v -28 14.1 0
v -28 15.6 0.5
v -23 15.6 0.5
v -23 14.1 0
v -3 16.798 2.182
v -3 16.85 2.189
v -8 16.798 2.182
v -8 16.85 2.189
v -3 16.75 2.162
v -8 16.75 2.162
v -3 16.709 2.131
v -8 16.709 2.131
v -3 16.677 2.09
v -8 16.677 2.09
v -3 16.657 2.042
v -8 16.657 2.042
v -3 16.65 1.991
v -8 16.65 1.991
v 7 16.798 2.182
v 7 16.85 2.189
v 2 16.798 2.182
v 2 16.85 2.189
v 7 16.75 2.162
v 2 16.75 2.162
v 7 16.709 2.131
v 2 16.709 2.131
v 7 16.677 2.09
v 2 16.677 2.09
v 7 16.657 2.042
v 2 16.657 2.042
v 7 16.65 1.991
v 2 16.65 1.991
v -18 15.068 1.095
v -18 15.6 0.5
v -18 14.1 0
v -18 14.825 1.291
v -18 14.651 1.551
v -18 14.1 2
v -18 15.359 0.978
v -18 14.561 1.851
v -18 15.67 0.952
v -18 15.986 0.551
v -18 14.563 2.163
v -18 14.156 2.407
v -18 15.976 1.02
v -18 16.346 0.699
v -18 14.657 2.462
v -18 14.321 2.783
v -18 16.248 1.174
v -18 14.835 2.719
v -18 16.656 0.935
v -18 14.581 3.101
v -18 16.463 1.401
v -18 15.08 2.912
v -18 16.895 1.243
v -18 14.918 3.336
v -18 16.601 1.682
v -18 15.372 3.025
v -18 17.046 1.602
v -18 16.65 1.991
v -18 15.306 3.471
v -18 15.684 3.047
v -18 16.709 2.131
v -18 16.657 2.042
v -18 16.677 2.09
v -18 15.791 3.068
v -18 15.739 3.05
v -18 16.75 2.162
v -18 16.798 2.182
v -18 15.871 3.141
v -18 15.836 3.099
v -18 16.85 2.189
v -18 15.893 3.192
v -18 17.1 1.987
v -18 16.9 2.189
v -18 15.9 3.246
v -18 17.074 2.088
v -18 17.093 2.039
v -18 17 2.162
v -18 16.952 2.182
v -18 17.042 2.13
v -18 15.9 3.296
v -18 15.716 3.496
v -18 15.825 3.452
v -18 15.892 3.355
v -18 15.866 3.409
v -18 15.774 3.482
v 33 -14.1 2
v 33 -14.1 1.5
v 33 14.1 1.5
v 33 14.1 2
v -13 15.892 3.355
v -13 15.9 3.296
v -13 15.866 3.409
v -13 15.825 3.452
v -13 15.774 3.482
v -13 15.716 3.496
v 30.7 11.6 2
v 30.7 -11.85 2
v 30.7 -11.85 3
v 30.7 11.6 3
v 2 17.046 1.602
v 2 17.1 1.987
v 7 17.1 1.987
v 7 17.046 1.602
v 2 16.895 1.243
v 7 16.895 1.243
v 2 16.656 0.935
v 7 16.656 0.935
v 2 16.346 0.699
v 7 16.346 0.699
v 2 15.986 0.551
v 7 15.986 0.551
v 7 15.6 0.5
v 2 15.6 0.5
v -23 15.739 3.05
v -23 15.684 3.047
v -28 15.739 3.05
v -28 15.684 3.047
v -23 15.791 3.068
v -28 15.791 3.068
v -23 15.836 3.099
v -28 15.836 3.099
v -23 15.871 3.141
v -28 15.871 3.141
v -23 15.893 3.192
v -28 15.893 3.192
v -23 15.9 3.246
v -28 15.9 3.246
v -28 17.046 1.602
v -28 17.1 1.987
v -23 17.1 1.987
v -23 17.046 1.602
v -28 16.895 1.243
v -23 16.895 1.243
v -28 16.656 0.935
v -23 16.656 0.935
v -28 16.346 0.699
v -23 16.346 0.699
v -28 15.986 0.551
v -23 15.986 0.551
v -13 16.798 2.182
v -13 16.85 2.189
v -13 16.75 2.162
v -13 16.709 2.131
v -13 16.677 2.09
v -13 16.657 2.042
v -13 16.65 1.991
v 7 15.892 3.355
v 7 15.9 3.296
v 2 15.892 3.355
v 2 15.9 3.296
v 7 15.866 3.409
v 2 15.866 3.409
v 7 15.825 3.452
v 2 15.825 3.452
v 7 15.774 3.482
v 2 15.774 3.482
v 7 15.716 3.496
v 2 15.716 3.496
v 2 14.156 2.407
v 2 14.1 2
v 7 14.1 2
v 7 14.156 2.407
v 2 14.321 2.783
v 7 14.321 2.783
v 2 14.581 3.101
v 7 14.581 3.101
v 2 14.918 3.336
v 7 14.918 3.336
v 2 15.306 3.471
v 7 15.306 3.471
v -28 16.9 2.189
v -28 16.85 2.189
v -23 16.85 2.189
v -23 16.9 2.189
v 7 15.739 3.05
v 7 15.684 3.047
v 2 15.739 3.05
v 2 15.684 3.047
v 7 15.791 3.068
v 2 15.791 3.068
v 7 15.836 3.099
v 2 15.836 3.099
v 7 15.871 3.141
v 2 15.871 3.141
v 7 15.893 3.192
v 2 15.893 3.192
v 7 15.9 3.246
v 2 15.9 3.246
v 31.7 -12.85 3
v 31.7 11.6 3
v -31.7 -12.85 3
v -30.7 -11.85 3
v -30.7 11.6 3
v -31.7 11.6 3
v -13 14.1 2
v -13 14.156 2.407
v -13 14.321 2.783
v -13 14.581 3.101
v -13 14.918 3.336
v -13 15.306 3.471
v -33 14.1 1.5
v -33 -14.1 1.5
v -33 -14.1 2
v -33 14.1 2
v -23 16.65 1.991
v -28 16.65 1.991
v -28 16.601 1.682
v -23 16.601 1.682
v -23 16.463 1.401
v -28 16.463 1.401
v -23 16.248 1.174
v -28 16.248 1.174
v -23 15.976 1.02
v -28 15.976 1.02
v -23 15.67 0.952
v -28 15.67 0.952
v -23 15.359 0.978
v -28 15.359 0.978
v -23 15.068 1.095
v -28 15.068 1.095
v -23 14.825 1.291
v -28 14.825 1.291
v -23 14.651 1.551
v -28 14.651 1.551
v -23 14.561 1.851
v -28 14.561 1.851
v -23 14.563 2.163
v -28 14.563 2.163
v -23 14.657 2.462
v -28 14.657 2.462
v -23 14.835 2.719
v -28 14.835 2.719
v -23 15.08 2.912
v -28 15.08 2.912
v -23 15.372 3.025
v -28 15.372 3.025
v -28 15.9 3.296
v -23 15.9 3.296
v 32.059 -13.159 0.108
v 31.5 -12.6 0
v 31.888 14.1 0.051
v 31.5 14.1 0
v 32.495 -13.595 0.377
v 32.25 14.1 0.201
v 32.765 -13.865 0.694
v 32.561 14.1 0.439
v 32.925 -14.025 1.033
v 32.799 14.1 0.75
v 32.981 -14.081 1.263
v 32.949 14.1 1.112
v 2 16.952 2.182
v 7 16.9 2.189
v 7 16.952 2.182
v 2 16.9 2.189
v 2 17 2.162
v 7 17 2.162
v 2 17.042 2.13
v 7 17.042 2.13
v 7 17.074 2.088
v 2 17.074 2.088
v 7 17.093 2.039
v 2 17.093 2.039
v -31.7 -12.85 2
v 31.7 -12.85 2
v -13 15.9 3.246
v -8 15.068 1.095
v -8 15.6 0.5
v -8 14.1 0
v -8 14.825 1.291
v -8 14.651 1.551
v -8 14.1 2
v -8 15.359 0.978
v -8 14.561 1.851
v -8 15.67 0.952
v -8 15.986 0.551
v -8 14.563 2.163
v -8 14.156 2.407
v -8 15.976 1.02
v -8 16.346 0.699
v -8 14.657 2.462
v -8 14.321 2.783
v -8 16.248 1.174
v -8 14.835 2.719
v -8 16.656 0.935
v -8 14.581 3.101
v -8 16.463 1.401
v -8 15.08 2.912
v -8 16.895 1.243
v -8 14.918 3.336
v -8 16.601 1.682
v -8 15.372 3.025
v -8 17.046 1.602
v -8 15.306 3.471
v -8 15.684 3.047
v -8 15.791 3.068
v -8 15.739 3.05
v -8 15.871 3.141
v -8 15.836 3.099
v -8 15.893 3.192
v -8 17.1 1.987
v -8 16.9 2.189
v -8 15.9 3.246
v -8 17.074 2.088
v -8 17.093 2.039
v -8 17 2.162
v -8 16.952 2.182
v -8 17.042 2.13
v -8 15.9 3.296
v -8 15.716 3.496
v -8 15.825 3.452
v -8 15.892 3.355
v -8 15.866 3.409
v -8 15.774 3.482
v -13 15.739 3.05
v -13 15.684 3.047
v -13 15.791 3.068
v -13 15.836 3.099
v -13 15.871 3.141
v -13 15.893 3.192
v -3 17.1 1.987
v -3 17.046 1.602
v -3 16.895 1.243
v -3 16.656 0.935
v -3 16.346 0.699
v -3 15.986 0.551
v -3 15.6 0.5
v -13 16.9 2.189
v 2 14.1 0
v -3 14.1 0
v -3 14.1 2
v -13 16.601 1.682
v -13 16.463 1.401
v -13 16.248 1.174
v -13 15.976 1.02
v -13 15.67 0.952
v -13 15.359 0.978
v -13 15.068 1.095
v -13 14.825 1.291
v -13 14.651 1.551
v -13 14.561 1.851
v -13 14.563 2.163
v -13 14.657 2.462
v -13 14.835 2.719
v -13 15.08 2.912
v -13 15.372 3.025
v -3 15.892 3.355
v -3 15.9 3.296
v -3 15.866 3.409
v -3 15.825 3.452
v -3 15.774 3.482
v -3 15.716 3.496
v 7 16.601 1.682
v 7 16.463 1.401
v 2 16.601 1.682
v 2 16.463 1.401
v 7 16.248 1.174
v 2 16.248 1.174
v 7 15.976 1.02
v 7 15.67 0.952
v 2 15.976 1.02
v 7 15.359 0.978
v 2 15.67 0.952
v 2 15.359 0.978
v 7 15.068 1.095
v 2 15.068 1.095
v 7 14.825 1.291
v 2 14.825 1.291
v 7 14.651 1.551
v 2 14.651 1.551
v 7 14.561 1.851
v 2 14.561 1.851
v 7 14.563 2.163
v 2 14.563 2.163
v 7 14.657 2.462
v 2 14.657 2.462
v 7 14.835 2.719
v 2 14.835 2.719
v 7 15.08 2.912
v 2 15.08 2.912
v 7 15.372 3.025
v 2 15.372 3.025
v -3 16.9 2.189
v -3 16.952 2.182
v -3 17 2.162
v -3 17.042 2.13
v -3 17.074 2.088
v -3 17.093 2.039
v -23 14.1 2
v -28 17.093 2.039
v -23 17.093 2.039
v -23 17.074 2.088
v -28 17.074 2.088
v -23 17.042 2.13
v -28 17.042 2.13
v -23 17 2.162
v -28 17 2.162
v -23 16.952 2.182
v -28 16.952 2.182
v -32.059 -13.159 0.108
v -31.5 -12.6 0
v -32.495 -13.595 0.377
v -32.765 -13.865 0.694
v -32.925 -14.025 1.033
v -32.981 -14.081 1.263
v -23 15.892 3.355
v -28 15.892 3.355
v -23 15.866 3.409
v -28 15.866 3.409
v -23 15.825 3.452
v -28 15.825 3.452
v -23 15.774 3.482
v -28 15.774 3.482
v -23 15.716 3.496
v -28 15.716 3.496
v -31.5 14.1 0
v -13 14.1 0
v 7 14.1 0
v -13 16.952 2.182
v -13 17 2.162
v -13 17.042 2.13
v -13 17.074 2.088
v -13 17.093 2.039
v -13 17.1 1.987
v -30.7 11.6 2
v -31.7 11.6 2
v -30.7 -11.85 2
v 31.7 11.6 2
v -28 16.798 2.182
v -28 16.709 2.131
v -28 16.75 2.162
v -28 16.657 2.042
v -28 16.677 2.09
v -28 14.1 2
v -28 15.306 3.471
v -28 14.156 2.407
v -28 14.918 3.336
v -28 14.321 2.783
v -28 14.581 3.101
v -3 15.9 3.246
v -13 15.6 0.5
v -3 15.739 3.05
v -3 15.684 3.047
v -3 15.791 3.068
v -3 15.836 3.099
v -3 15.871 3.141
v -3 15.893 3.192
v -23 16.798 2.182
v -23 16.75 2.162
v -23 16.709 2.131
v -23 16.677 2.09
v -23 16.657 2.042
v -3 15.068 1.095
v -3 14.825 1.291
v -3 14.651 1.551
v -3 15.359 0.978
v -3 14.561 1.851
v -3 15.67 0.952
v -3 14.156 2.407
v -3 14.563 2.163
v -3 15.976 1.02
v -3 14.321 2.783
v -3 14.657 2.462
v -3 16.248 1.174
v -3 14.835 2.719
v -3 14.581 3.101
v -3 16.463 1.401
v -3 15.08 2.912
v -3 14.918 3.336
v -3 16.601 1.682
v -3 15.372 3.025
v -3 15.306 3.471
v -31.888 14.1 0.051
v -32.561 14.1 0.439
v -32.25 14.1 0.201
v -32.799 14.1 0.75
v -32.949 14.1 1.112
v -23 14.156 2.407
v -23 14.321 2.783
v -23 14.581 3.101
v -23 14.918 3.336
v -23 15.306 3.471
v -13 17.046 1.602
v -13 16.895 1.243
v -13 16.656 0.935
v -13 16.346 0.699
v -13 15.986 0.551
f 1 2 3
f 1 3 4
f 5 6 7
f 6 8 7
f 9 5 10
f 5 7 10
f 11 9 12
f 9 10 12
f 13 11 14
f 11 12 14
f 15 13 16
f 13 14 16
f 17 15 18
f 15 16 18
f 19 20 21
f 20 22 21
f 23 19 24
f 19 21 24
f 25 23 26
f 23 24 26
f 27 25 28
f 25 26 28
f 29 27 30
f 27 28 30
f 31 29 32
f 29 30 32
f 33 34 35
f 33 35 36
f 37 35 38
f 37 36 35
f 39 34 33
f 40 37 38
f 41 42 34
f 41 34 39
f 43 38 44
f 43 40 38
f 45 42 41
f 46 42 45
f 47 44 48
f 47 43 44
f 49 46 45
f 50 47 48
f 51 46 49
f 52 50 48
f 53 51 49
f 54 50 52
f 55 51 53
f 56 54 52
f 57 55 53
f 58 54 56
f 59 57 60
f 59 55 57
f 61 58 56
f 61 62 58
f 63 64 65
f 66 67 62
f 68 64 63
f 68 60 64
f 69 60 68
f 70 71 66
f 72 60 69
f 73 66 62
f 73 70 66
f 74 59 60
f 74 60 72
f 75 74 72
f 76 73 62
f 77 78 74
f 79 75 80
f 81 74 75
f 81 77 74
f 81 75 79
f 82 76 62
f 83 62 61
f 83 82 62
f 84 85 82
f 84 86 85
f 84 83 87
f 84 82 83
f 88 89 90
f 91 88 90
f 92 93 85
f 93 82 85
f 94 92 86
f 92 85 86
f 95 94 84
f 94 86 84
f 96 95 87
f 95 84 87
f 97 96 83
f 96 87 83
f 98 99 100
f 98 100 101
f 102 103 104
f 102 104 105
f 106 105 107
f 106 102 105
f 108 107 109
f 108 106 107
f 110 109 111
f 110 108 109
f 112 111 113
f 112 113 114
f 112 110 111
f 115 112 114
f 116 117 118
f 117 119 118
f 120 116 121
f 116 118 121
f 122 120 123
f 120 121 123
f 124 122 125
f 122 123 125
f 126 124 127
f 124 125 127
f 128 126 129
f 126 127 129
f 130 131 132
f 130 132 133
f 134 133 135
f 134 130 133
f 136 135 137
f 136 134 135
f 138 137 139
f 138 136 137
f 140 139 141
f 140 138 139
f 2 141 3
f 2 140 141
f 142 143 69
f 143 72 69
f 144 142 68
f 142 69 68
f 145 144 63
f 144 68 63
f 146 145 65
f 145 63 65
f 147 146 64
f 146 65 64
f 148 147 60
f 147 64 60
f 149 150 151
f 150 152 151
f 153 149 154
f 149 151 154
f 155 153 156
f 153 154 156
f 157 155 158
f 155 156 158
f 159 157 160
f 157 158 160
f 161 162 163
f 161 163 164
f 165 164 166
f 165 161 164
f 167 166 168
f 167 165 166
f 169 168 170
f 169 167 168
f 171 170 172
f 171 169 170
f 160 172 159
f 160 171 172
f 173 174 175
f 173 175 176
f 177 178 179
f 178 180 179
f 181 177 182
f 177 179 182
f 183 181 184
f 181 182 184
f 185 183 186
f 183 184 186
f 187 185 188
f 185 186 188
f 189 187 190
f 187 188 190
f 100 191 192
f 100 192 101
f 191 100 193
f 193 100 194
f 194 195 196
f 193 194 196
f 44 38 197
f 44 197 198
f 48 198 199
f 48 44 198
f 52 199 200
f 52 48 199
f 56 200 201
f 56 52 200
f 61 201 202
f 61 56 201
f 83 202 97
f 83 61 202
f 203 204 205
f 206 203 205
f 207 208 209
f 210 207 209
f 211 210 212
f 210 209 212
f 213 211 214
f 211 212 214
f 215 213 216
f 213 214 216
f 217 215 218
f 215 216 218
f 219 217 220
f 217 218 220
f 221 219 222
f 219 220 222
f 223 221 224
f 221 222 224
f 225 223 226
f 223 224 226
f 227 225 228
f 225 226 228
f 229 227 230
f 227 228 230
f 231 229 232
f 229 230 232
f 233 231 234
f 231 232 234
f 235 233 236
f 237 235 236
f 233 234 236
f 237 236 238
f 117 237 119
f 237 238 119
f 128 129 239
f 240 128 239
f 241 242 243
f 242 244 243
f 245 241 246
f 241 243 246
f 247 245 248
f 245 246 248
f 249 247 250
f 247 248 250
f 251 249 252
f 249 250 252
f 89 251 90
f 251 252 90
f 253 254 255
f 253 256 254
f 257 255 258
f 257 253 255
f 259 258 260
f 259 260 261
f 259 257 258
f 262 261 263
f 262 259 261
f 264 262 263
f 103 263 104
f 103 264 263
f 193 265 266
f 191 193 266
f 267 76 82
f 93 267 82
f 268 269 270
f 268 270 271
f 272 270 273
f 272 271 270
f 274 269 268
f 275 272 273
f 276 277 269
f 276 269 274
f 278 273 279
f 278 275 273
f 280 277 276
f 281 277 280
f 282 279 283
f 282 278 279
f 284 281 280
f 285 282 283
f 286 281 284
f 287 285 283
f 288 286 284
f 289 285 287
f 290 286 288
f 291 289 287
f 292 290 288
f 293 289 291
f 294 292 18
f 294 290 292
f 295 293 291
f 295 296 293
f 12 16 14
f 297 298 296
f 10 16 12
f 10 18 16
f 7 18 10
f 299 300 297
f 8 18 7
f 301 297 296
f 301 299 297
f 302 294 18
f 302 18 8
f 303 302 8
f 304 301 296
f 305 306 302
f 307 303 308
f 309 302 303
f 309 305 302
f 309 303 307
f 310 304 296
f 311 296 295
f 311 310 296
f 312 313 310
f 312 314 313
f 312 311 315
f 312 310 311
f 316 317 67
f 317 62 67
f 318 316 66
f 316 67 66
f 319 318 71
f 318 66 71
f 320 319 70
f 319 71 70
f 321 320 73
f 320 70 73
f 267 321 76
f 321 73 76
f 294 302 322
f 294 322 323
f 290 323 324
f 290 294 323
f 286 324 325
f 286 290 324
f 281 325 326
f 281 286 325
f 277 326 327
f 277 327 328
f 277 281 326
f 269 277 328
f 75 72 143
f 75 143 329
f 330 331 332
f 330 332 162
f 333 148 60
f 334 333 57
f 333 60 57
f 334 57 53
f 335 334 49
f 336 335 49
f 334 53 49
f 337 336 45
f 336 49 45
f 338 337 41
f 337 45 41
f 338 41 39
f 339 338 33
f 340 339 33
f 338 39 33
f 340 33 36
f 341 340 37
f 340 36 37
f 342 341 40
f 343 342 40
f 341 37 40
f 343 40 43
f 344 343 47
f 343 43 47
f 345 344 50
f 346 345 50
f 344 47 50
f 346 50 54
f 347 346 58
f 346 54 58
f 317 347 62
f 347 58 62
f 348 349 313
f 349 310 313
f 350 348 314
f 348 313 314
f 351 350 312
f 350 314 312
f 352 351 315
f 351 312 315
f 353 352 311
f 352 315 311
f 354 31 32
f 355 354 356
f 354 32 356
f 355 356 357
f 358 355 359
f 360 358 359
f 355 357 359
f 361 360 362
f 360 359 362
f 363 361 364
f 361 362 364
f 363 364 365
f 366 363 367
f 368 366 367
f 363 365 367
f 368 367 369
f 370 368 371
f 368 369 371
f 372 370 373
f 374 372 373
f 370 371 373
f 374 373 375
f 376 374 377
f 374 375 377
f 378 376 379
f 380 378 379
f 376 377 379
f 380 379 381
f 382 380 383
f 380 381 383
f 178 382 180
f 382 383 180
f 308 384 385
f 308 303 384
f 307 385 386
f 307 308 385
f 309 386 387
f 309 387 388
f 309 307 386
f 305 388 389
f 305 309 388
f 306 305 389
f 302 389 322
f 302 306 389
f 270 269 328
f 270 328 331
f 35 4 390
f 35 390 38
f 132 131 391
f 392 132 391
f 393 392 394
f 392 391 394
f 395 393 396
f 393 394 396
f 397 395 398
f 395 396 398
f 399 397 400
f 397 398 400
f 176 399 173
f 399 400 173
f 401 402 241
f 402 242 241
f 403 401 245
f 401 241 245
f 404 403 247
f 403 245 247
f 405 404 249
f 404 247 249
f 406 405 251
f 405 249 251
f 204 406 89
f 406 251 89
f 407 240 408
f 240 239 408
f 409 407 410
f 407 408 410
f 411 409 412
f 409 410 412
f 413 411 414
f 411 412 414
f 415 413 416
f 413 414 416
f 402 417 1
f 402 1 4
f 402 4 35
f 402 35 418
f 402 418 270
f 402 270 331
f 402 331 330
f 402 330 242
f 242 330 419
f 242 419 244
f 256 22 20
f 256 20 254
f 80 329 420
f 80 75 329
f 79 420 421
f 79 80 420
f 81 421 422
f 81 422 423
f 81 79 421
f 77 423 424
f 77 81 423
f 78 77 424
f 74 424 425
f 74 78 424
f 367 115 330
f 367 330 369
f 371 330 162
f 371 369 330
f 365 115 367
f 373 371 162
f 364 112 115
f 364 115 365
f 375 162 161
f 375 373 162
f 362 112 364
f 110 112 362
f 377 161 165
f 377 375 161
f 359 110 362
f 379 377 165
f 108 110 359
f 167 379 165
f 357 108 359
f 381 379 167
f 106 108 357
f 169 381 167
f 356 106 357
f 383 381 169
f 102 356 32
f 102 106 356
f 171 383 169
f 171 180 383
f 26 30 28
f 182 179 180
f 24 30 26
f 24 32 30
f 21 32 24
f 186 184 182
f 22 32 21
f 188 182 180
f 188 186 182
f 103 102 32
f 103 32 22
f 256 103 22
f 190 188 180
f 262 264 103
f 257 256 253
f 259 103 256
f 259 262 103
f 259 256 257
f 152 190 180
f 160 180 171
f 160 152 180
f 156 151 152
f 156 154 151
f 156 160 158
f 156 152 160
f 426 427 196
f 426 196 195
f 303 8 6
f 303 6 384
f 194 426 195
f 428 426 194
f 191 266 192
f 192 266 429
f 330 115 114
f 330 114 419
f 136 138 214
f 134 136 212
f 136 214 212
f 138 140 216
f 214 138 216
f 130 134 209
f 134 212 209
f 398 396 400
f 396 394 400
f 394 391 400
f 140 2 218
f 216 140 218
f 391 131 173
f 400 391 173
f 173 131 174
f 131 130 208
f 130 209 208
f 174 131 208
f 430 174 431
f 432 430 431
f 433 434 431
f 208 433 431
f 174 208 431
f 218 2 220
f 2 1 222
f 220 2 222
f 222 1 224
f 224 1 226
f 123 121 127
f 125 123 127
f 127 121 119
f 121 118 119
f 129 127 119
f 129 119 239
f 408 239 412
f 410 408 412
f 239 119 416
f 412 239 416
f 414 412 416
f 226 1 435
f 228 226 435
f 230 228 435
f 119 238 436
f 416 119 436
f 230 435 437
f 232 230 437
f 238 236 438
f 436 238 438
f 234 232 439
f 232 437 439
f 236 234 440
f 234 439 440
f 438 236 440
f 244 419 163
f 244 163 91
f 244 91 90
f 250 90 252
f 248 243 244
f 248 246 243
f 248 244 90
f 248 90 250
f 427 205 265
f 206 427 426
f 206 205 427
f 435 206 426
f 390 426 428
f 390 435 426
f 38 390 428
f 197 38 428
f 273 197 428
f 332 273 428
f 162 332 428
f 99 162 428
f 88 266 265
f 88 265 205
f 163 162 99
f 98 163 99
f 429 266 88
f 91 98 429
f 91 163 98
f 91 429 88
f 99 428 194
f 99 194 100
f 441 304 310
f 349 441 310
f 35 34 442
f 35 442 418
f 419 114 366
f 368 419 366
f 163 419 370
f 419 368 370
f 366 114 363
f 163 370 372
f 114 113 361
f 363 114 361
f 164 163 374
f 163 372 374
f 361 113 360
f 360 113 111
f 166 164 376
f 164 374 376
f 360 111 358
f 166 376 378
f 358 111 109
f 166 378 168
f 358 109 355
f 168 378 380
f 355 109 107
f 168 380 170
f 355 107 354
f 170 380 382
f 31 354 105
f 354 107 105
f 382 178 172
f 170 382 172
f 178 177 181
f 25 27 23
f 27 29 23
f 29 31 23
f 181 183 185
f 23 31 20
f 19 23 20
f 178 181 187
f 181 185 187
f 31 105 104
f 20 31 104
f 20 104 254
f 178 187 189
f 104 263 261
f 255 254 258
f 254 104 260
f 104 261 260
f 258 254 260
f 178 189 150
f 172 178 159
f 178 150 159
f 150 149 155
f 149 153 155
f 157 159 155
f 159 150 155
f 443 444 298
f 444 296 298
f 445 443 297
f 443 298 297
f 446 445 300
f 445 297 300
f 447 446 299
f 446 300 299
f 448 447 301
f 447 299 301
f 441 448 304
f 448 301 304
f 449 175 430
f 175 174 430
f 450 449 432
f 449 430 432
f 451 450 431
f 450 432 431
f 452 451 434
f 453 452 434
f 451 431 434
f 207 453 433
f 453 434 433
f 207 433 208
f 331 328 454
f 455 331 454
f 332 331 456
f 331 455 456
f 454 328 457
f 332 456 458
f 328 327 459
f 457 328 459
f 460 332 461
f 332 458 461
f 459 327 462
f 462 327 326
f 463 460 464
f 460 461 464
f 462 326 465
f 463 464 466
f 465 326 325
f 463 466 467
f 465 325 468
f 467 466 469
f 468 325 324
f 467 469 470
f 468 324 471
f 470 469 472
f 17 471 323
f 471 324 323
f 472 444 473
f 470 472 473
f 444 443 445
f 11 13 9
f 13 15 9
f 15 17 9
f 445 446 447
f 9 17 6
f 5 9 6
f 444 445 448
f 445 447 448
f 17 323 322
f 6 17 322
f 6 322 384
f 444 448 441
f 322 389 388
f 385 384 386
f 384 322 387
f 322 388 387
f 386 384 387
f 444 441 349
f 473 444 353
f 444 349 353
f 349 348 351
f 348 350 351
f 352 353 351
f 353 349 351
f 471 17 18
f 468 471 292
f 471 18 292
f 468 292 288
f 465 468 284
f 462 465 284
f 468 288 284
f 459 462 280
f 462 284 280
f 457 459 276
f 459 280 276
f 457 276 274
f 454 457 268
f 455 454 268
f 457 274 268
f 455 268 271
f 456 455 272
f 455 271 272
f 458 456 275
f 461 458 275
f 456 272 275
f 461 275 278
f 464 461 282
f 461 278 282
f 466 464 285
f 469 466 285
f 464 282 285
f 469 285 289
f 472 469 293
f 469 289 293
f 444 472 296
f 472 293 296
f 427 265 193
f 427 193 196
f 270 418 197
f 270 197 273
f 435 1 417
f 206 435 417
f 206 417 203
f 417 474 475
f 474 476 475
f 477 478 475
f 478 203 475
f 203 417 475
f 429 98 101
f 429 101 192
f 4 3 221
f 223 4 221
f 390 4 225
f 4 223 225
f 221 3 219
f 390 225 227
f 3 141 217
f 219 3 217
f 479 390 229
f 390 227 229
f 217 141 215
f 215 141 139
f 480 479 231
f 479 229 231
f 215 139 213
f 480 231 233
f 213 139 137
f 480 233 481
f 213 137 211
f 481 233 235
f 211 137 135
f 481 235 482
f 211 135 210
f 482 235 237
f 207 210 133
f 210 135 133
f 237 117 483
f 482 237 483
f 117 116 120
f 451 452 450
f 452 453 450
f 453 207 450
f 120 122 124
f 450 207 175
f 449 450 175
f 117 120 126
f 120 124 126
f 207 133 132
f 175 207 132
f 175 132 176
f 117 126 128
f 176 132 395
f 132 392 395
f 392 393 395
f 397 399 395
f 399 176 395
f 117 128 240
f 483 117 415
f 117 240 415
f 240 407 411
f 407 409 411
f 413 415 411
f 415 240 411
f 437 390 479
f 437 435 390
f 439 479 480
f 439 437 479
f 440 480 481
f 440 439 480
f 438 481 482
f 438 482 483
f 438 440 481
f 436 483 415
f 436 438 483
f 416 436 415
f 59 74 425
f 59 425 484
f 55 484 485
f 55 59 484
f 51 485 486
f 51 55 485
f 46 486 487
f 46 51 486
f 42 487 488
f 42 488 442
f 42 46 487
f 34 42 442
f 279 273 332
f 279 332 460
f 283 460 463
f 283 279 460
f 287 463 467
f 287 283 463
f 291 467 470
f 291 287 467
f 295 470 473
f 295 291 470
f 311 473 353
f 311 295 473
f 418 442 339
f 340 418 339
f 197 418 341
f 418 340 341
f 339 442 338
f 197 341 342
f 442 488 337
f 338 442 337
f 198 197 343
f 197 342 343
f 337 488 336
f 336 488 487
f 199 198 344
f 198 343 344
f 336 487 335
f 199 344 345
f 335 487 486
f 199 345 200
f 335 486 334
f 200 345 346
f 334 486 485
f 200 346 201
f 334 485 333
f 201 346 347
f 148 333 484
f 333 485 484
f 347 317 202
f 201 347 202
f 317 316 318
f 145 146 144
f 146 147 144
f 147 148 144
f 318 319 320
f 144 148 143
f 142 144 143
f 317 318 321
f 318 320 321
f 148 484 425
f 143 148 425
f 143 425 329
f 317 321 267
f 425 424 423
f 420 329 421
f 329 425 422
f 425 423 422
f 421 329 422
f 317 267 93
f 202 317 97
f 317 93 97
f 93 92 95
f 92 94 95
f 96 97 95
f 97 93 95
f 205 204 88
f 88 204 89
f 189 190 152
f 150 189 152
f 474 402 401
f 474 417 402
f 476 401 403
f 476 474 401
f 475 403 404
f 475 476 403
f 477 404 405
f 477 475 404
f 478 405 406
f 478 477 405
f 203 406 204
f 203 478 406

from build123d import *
from OCP.BRepAlgoAPI import BRepAlgoAPI_Cut
from OCP.TopTools import TopTools_ListOfShape

# Parameters (mm, degrees)
SKETCH1_W              = 66
SKETCH1_H              = 28.2
BOSS_EXTRUDE1_DEPTH    = 2
SKETCH5_R              = 1.0500000000000005
BOSS_EXTRUDE2_DEPTH    = 5
SKETCH8_W              = 1.7595642605370743
SKETCH8_H              = 1.7595642605370756
CUT_EXTRUDE3_DEPTH     = 5
FILLET4_R              = 0.2
LPATTERN1_COUNT        = 8
LPATTERN1_PITCH        = 5
LPATTERN1_2_COUNT      = 8
LPATTERN1_2_PITCH      = 5
FILLET4_OF_LPATTERN1_R = 0.2
CUT_EXTRUDE1_DEPTH     = 44.54870836201689
FILLET5_R              = 1.5
BOSS_EXTRUDE3_DEPTH    = 1


with BuildPart() as part:
    # Sketch1 → Boss-Extrude1 (new body)
    with BuildSketch(Plane.XY):
        Rectangle(SKETCH1_W, SKETCH1_H)
    extrude(amount=BOSS_EXTRUDE1_DEPTH)


with BuildPart() as body_2:
    # Sketch5 → Boss-Extrude2 (new body)
    with BuildSketch(Plane.ZY.offset(33)):
        with BuildLine():
            Line((0.5, 15.599999999999998), (0, 14.099999999999998))
            Line((0, 14.099999999999998), (2, 14.099999999999998))
            ThreePointArc((2, 14.099999999999998), (3.0606601717798214, 16.66066017177982), (0.5, 15.599999999999998))
        make_face()
        with Locations((2, 15.599999999999998)):
            Circle(SKETCH5_R, mode=Mode.SUBTRACT)
    boss_extrude2 = extrude(amount=-BOSS_EXTRUDE2_DEPTH)

    # Sketch8 → Cut-Extrude3 (cut)
    with BuildSketch(Plane.ZY.offset(33)):
        with Locations((3.068777942853419, 16.780207609912114)):
            Rectangle(SKETCH8_W, SKETCH8_H)
    cut_extrude3 = extrude(amount=-CUT_EXTRUDE3_DEPTH, mode=Mode.SUBTRACT)

    # Fillet4
    fillet4_edges = [body_2.edges().sort_by_distance(p)[0] for p in [
        (-30.5, 16.632850706939475, 2.1889958125848823),
        (-30.5, 15.900425479643578, 3.006103638389667),
        (-30.5, 17.08804589405884, 2.1889958125848823),
        (-30.5, 15.900425479643578, 3.4696069308427098),
    ]]
    fillet(fillet4_edges, radius=FILLET4_R)


with BuildPart() as part_1:
    add(part.part)

    add(body_2.part)  # LPattern1 merges body 2
    # LPattern1: Boss-Extrude2 ×8, 3 skipped
    with Locations(*[(i * LPATTERN1_PITCH, 0, 0) for i in range(1, LPATTERN1_COUNT) if i not in (2, 4, 6)]):
        add(boss_extrude2)

    # LPattern1 2: Cut-Extrude3 ×8, 3 skipped
    with Locations(*[(i * LPATTERN1_2_PITCH, 0, 0) for i in range(1, LPATTERN1_2_COUNT) if i not in (2, 4, 6)]):
        add(cut_extrude3, mode=Mode.SUBTRACT)

    # Fillet4 of LPattern1
    fillet4_of_lpattern1_edges = [part_1.edges().sort_by_distance(p)[0] for p in [
        (-25.5, 16.632850706939475, 2.1889958125848823),
        (-25.5, 15.900425479643578, 3.006103638389667),
        (-25.5, 17.08804589405884, 2.1889958125848823),
        (-25.5, 15.900425479643578, 3.4696069308427098),
        (-15.5, 16.632850706939475, 2.1889958125848823),
        (-15.5, 15.900425479643578, 3.006103638389667),
        (-15.5, 17.08804589405884, 2.1889958125848823),
        (-15.5, 15.900425479643578, 3.4696069308427098),
        (-5.5, 16.632850706939475, 2.1889958125848823),
        (-5.5, 15.900425479643578, 3.006103638389667),
        (-5.5, 17.08804589405884, 2.1889958125848823),
        (-5.5, 15.900425479643578, 3.4696069308427098),
        (4.5, 16.632850706939475, 2.1889958125848823),
        (4.5, 15.900425479643578, 3.006103638389667),
        (4.5, 17.08804589405884, 2.1889958125848823),
        (4.5, 15.900425479643578, 3.4696069308427098),
    ]]
    fillet(fillet4_of_lpattern1_edges, radius=FILLET4_OF_LPATTERN1_R)


with BuildPart() as cut_extrude1_tool:
    # Sketch6 → Cut-Extrude1 (new, through all)
    with BuildSketch(Plane(origin=(0, 14.099999999999998, 0), x_dir=(1, 0, 0), z_dir=(0, 1, 0))):
        Polygon((-33, 0), (-28, 0), (-28, -7.434056861178039), (-33, -7.434056861178038), align=None)
    extrude(amount=CUT_EXTRUDE1_DEPTH)


with BuildPart() as part_2:
    add(part_1.part)

    # Cut-Extrude1: cut by cut_extrude1_tool, with a tolerance
    cut_extrude1_stock = TopTools_ListOfShape()
    cut_extrude1_stock.Append(part_2.part.wrapped)
    cut_extrude1_tools = TopTools_ListOfShape()
    cut_extrude1_tools.Append(cut_extrude1_tool.part.wrapped)
    cut_extrude1_cut = BRepAlgoAPI_Cut()
    cut_extrude1_cut.SetArguments(cut_extrude1_stock)
    cut_extrude1_cut.SetTools(cut_extrude1_tools)
    cut_extrude1_cut.SetFuzzyValue(0.00001)
    cut_extrude1_cut.Build()
    add(Compound.cast(cut_extrude1_cut.Shape()).solids(), mode=Mode.REPLACE)

    # Fillet5
    fillet5_edges = [part_2.edges().sort_by_distance(p)[0] for p in [
        (0, -14.100000000000001, 0),
        (-33, -1.78e-15, 0),
        (33, -1.78e-15, 0),
    ]]
    fillet(fillet5_edges, radius=FILLET5_R)

    # Sketch9 → Boss-Extrude3 (add)
    with BuildSketch(Plane.XY.offset(2)):
        Polygon((-31.7, 11.599999999999998), (-30.7, 11.599999999999998), (-30.699999999999996, -11.85000000000001), (30.7, -11.85000000000001), (30.7, 11.599999999999994), (31.7, 11.599999999999996), (31.7, -11.850000000000012), (31.700000000000006, -12.850000000000001), (-30.7, -12.85000000000001), (-31.7, -12.850000000000009), align=None)
    extrude(amount=BOSS_EXTRUDE3_DEPTH)


solid = part_2.part
